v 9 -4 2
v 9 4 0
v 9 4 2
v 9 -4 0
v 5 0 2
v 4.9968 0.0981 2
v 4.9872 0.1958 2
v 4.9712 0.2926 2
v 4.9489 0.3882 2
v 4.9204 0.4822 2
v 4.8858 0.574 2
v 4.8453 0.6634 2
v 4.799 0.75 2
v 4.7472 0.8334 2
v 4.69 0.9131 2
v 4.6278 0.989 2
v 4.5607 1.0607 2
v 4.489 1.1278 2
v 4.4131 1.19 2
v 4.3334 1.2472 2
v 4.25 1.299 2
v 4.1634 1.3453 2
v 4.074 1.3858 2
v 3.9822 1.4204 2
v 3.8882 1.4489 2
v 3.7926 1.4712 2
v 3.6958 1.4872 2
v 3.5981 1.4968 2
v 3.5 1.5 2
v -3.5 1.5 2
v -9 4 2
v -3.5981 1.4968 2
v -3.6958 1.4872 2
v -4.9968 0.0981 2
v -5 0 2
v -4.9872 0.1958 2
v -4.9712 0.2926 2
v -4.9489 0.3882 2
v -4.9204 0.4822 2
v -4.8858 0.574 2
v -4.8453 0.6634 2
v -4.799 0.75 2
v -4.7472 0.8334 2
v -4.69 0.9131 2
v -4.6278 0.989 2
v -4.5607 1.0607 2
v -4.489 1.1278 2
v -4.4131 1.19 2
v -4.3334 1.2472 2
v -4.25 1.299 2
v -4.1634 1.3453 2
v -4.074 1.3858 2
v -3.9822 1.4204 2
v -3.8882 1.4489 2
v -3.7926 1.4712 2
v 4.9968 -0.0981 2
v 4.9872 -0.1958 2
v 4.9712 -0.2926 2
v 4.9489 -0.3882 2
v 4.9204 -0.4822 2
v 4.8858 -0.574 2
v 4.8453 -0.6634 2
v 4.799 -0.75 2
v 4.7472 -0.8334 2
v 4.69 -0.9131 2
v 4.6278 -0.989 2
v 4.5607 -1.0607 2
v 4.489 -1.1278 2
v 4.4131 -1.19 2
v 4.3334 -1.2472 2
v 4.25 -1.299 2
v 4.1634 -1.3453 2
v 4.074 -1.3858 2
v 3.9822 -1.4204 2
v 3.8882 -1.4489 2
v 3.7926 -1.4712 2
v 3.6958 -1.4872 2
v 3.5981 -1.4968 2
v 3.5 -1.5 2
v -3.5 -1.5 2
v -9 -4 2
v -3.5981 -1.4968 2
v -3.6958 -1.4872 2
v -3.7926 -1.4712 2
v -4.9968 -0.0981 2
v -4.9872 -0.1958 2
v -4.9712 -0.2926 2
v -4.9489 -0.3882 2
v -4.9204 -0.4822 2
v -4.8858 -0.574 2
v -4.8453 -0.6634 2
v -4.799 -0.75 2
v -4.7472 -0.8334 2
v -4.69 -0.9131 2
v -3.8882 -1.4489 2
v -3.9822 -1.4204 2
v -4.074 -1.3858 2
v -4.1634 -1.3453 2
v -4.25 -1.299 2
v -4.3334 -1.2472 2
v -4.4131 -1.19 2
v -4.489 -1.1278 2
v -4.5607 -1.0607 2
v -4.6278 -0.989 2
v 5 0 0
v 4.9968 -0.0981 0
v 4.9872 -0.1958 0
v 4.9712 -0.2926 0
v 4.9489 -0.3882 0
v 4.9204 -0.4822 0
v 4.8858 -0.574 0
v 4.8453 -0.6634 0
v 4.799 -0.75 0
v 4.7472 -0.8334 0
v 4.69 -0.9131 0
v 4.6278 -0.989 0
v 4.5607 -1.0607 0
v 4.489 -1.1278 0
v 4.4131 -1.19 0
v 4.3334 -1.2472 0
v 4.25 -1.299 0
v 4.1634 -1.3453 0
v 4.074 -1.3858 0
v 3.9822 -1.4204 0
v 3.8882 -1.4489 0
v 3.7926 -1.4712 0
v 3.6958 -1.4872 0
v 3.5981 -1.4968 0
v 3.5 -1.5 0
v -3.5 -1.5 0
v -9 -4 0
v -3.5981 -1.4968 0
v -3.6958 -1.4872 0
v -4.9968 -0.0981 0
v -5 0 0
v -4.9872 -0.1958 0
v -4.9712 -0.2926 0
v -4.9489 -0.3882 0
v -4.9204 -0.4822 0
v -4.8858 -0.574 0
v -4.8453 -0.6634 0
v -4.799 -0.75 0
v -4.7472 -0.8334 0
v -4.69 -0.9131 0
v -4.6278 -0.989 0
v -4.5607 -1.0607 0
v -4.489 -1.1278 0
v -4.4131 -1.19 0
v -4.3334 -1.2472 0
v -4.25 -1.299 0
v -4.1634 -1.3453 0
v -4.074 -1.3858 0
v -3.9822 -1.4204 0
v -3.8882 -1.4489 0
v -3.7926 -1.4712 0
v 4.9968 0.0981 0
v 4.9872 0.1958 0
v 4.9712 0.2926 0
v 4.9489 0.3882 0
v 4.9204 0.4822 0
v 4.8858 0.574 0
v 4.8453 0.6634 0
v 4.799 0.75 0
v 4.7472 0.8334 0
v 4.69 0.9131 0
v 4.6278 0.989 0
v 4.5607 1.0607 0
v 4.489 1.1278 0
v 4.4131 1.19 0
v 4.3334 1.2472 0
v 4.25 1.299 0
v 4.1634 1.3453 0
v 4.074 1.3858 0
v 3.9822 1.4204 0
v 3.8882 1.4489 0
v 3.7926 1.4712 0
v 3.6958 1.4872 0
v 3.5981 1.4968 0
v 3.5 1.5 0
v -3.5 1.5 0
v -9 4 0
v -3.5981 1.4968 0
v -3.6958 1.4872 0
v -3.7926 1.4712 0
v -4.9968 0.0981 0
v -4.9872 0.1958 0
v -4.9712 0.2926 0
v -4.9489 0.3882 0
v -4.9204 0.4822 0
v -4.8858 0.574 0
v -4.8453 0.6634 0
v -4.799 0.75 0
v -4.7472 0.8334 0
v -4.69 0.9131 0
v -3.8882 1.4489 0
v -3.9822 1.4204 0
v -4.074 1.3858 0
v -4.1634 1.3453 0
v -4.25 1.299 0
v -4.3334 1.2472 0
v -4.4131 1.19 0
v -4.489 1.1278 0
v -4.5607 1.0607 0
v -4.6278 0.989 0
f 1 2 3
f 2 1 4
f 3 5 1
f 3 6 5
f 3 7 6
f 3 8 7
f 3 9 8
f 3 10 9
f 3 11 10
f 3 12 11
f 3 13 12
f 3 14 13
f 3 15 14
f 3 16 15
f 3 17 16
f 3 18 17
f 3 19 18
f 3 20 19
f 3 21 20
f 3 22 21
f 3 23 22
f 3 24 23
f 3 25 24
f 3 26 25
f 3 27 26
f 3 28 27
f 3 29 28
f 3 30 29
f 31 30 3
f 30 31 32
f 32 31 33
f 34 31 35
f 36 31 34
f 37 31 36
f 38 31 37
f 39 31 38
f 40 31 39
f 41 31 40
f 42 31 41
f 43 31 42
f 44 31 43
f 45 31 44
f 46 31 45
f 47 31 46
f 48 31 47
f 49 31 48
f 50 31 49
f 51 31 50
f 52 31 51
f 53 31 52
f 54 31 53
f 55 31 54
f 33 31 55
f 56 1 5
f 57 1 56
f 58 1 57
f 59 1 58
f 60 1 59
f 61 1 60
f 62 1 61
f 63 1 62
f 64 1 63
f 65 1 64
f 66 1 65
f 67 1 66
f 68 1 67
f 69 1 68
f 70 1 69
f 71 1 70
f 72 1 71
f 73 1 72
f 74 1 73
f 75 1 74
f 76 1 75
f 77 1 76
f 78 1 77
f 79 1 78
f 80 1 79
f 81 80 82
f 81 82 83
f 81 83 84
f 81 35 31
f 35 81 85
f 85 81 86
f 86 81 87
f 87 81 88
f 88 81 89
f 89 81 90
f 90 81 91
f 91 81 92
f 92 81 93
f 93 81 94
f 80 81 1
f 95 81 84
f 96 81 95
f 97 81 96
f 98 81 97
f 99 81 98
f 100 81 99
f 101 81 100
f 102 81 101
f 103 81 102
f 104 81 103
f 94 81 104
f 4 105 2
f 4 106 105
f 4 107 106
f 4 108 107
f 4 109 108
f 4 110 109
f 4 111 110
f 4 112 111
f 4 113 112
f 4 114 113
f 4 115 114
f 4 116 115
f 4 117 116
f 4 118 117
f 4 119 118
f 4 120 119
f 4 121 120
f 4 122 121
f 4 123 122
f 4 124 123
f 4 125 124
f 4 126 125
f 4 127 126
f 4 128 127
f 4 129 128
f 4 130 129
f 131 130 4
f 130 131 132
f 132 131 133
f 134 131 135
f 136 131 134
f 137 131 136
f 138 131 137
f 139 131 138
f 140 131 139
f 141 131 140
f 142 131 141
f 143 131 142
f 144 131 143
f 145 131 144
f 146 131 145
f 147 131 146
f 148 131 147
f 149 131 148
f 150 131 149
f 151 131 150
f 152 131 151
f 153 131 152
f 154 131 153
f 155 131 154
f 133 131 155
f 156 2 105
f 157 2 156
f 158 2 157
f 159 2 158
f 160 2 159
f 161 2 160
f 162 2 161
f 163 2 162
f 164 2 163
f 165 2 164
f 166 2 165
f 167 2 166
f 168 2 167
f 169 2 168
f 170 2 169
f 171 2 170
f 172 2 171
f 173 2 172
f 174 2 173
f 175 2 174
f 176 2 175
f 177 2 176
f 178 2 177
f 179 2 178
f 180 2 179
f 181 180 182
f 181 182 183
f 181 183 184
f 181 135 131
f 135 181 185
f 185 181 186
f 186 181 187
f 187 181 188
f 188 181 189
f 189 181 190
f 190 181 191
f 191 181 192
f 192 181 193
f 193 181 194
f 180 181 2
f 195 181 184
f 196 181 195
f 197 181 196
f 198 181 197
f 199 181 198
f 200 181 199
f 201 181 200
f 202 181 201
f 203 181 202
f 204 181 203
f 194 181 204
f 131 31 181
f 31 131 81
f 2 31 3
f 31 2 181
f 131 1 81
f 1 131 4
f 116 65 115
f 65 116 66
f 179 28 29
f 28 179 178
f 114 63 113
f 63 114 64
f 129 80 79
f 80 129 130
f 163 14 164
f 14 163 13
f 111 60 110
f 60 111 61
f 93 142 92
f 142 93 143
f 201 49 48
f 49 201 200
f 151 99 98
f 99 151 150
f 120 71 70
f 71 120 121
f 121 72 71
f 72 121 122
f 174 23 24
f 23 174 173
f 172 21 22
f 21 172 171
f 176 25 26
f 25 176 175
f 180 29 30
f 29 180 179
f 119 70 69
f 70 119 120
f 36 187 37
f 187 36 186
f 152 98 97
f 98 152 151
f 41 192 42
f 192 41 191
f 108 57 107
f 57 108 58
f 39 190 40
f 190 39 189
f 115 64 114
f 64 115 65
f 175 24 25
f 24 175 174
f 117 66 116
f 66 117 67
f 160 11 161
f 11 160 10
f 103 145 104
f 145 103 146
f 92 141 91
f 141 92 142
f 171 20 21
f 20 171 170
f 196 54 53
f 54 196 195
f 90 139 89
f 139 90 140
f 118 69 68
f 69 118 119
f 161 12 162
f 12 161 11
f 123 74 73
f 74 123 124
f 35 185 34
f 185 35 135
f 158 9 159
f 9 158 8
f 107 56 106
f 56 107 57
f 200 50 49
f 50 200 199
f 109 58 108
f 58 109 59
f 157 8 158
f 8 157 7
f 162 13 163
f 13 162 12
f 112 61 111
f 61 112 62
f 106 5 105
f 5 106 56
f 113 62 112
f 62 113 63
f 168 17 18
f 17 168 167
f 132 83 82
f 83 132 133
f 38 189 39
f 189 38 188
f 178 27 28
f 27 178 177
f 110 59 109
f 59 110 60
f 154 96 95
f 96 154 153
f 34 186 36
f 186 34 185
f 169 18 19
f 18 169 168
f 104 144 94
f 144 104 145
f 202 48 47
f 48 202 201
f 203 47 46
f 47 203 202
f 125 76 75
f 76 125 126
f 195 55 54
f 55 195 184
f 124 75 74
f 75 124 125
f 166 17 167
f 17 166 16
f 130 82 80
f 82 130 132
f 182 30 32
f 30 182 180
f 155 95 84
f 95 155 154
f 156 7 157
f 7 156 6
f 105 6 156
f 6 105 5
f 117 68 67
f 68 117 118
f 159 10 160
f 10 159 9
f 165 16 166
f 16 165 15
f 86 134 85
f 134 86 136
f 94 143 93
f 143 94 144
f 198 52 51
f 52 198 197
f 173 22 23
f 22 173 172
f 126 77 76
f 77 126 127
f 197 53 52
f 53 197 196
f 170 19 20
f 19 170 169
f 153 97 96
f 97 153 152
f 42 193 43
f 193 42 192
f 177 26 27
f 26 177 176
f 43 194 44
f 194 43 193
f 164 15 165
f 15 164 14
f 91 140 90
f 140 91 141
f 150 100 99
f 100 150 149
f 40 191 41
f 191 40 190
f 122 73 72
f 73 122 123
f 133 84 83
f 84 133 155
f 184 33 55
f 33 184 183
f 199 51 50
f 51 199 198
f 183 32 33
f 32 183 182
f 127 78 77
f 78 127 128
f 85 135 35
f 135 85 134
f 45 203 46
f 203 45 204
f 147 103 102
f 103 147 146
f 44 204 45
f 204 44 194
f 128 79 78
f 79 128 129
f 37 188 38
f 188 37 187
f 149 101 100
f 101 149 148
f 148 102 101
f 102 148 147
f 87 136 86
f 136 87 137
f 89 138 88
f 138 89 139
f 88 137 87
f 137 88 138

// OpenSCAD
// Auto-generated from tests/data/feature_fixtures_manifest.json
// fixture: plate_single_slot
// fixture_type: plate
// description: Single rounded slot in a compact plate.
$fn = 96;

plate_size = [18.000000, 8.000000, 2.000000];
plate_origin = [-9.000000, -4.000000, 0.000000];

module through_hole(center, diameter, height) {
  translate(center) cylinder(d=diameter, h=height, center=false);
}

module through_slot(start, end, width, height) {
  hull() {
    through_hole(start, width, height);
    through_hole(end, width, height);
  }
}

module counterbore_hole(center, through_d, bore_d, bore_depth, height) {
  translate(center) cylinder(d=through_d, h=height, center=false);
  translate([center[0], center[1], center[2] + height - bore_depth])
    cylinder(d=bore_d, h=bore_depth + 0.1, center=false);
}

difference() {
  translate(plate_origin) cube(plate_size);
  through_slot([-3.500000, 0.000000, -0.100000], [3.500000, 0.000000, -0.100000], 3.000000, 2.200000);  // slot_0
}
